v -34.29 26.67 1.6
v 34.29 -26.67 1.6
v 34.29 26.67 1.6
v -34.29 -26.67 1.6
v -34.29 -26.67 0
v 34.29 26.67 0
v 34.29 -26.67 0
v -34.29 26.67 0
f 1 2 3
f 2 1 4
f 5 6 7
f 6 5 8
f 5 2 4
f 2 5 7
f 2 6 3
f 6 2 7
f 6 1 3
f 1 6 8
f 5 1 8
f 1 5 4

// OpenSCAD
$fn = 64;

board_x = 68.58;
board_y = 53.34;
board_th = 1.6;

color([0.05, 0.45, 0.18])
translate([-board_x/2, -board_y/2, 0])
cube([board_x, board_y, board_th], center=false);
